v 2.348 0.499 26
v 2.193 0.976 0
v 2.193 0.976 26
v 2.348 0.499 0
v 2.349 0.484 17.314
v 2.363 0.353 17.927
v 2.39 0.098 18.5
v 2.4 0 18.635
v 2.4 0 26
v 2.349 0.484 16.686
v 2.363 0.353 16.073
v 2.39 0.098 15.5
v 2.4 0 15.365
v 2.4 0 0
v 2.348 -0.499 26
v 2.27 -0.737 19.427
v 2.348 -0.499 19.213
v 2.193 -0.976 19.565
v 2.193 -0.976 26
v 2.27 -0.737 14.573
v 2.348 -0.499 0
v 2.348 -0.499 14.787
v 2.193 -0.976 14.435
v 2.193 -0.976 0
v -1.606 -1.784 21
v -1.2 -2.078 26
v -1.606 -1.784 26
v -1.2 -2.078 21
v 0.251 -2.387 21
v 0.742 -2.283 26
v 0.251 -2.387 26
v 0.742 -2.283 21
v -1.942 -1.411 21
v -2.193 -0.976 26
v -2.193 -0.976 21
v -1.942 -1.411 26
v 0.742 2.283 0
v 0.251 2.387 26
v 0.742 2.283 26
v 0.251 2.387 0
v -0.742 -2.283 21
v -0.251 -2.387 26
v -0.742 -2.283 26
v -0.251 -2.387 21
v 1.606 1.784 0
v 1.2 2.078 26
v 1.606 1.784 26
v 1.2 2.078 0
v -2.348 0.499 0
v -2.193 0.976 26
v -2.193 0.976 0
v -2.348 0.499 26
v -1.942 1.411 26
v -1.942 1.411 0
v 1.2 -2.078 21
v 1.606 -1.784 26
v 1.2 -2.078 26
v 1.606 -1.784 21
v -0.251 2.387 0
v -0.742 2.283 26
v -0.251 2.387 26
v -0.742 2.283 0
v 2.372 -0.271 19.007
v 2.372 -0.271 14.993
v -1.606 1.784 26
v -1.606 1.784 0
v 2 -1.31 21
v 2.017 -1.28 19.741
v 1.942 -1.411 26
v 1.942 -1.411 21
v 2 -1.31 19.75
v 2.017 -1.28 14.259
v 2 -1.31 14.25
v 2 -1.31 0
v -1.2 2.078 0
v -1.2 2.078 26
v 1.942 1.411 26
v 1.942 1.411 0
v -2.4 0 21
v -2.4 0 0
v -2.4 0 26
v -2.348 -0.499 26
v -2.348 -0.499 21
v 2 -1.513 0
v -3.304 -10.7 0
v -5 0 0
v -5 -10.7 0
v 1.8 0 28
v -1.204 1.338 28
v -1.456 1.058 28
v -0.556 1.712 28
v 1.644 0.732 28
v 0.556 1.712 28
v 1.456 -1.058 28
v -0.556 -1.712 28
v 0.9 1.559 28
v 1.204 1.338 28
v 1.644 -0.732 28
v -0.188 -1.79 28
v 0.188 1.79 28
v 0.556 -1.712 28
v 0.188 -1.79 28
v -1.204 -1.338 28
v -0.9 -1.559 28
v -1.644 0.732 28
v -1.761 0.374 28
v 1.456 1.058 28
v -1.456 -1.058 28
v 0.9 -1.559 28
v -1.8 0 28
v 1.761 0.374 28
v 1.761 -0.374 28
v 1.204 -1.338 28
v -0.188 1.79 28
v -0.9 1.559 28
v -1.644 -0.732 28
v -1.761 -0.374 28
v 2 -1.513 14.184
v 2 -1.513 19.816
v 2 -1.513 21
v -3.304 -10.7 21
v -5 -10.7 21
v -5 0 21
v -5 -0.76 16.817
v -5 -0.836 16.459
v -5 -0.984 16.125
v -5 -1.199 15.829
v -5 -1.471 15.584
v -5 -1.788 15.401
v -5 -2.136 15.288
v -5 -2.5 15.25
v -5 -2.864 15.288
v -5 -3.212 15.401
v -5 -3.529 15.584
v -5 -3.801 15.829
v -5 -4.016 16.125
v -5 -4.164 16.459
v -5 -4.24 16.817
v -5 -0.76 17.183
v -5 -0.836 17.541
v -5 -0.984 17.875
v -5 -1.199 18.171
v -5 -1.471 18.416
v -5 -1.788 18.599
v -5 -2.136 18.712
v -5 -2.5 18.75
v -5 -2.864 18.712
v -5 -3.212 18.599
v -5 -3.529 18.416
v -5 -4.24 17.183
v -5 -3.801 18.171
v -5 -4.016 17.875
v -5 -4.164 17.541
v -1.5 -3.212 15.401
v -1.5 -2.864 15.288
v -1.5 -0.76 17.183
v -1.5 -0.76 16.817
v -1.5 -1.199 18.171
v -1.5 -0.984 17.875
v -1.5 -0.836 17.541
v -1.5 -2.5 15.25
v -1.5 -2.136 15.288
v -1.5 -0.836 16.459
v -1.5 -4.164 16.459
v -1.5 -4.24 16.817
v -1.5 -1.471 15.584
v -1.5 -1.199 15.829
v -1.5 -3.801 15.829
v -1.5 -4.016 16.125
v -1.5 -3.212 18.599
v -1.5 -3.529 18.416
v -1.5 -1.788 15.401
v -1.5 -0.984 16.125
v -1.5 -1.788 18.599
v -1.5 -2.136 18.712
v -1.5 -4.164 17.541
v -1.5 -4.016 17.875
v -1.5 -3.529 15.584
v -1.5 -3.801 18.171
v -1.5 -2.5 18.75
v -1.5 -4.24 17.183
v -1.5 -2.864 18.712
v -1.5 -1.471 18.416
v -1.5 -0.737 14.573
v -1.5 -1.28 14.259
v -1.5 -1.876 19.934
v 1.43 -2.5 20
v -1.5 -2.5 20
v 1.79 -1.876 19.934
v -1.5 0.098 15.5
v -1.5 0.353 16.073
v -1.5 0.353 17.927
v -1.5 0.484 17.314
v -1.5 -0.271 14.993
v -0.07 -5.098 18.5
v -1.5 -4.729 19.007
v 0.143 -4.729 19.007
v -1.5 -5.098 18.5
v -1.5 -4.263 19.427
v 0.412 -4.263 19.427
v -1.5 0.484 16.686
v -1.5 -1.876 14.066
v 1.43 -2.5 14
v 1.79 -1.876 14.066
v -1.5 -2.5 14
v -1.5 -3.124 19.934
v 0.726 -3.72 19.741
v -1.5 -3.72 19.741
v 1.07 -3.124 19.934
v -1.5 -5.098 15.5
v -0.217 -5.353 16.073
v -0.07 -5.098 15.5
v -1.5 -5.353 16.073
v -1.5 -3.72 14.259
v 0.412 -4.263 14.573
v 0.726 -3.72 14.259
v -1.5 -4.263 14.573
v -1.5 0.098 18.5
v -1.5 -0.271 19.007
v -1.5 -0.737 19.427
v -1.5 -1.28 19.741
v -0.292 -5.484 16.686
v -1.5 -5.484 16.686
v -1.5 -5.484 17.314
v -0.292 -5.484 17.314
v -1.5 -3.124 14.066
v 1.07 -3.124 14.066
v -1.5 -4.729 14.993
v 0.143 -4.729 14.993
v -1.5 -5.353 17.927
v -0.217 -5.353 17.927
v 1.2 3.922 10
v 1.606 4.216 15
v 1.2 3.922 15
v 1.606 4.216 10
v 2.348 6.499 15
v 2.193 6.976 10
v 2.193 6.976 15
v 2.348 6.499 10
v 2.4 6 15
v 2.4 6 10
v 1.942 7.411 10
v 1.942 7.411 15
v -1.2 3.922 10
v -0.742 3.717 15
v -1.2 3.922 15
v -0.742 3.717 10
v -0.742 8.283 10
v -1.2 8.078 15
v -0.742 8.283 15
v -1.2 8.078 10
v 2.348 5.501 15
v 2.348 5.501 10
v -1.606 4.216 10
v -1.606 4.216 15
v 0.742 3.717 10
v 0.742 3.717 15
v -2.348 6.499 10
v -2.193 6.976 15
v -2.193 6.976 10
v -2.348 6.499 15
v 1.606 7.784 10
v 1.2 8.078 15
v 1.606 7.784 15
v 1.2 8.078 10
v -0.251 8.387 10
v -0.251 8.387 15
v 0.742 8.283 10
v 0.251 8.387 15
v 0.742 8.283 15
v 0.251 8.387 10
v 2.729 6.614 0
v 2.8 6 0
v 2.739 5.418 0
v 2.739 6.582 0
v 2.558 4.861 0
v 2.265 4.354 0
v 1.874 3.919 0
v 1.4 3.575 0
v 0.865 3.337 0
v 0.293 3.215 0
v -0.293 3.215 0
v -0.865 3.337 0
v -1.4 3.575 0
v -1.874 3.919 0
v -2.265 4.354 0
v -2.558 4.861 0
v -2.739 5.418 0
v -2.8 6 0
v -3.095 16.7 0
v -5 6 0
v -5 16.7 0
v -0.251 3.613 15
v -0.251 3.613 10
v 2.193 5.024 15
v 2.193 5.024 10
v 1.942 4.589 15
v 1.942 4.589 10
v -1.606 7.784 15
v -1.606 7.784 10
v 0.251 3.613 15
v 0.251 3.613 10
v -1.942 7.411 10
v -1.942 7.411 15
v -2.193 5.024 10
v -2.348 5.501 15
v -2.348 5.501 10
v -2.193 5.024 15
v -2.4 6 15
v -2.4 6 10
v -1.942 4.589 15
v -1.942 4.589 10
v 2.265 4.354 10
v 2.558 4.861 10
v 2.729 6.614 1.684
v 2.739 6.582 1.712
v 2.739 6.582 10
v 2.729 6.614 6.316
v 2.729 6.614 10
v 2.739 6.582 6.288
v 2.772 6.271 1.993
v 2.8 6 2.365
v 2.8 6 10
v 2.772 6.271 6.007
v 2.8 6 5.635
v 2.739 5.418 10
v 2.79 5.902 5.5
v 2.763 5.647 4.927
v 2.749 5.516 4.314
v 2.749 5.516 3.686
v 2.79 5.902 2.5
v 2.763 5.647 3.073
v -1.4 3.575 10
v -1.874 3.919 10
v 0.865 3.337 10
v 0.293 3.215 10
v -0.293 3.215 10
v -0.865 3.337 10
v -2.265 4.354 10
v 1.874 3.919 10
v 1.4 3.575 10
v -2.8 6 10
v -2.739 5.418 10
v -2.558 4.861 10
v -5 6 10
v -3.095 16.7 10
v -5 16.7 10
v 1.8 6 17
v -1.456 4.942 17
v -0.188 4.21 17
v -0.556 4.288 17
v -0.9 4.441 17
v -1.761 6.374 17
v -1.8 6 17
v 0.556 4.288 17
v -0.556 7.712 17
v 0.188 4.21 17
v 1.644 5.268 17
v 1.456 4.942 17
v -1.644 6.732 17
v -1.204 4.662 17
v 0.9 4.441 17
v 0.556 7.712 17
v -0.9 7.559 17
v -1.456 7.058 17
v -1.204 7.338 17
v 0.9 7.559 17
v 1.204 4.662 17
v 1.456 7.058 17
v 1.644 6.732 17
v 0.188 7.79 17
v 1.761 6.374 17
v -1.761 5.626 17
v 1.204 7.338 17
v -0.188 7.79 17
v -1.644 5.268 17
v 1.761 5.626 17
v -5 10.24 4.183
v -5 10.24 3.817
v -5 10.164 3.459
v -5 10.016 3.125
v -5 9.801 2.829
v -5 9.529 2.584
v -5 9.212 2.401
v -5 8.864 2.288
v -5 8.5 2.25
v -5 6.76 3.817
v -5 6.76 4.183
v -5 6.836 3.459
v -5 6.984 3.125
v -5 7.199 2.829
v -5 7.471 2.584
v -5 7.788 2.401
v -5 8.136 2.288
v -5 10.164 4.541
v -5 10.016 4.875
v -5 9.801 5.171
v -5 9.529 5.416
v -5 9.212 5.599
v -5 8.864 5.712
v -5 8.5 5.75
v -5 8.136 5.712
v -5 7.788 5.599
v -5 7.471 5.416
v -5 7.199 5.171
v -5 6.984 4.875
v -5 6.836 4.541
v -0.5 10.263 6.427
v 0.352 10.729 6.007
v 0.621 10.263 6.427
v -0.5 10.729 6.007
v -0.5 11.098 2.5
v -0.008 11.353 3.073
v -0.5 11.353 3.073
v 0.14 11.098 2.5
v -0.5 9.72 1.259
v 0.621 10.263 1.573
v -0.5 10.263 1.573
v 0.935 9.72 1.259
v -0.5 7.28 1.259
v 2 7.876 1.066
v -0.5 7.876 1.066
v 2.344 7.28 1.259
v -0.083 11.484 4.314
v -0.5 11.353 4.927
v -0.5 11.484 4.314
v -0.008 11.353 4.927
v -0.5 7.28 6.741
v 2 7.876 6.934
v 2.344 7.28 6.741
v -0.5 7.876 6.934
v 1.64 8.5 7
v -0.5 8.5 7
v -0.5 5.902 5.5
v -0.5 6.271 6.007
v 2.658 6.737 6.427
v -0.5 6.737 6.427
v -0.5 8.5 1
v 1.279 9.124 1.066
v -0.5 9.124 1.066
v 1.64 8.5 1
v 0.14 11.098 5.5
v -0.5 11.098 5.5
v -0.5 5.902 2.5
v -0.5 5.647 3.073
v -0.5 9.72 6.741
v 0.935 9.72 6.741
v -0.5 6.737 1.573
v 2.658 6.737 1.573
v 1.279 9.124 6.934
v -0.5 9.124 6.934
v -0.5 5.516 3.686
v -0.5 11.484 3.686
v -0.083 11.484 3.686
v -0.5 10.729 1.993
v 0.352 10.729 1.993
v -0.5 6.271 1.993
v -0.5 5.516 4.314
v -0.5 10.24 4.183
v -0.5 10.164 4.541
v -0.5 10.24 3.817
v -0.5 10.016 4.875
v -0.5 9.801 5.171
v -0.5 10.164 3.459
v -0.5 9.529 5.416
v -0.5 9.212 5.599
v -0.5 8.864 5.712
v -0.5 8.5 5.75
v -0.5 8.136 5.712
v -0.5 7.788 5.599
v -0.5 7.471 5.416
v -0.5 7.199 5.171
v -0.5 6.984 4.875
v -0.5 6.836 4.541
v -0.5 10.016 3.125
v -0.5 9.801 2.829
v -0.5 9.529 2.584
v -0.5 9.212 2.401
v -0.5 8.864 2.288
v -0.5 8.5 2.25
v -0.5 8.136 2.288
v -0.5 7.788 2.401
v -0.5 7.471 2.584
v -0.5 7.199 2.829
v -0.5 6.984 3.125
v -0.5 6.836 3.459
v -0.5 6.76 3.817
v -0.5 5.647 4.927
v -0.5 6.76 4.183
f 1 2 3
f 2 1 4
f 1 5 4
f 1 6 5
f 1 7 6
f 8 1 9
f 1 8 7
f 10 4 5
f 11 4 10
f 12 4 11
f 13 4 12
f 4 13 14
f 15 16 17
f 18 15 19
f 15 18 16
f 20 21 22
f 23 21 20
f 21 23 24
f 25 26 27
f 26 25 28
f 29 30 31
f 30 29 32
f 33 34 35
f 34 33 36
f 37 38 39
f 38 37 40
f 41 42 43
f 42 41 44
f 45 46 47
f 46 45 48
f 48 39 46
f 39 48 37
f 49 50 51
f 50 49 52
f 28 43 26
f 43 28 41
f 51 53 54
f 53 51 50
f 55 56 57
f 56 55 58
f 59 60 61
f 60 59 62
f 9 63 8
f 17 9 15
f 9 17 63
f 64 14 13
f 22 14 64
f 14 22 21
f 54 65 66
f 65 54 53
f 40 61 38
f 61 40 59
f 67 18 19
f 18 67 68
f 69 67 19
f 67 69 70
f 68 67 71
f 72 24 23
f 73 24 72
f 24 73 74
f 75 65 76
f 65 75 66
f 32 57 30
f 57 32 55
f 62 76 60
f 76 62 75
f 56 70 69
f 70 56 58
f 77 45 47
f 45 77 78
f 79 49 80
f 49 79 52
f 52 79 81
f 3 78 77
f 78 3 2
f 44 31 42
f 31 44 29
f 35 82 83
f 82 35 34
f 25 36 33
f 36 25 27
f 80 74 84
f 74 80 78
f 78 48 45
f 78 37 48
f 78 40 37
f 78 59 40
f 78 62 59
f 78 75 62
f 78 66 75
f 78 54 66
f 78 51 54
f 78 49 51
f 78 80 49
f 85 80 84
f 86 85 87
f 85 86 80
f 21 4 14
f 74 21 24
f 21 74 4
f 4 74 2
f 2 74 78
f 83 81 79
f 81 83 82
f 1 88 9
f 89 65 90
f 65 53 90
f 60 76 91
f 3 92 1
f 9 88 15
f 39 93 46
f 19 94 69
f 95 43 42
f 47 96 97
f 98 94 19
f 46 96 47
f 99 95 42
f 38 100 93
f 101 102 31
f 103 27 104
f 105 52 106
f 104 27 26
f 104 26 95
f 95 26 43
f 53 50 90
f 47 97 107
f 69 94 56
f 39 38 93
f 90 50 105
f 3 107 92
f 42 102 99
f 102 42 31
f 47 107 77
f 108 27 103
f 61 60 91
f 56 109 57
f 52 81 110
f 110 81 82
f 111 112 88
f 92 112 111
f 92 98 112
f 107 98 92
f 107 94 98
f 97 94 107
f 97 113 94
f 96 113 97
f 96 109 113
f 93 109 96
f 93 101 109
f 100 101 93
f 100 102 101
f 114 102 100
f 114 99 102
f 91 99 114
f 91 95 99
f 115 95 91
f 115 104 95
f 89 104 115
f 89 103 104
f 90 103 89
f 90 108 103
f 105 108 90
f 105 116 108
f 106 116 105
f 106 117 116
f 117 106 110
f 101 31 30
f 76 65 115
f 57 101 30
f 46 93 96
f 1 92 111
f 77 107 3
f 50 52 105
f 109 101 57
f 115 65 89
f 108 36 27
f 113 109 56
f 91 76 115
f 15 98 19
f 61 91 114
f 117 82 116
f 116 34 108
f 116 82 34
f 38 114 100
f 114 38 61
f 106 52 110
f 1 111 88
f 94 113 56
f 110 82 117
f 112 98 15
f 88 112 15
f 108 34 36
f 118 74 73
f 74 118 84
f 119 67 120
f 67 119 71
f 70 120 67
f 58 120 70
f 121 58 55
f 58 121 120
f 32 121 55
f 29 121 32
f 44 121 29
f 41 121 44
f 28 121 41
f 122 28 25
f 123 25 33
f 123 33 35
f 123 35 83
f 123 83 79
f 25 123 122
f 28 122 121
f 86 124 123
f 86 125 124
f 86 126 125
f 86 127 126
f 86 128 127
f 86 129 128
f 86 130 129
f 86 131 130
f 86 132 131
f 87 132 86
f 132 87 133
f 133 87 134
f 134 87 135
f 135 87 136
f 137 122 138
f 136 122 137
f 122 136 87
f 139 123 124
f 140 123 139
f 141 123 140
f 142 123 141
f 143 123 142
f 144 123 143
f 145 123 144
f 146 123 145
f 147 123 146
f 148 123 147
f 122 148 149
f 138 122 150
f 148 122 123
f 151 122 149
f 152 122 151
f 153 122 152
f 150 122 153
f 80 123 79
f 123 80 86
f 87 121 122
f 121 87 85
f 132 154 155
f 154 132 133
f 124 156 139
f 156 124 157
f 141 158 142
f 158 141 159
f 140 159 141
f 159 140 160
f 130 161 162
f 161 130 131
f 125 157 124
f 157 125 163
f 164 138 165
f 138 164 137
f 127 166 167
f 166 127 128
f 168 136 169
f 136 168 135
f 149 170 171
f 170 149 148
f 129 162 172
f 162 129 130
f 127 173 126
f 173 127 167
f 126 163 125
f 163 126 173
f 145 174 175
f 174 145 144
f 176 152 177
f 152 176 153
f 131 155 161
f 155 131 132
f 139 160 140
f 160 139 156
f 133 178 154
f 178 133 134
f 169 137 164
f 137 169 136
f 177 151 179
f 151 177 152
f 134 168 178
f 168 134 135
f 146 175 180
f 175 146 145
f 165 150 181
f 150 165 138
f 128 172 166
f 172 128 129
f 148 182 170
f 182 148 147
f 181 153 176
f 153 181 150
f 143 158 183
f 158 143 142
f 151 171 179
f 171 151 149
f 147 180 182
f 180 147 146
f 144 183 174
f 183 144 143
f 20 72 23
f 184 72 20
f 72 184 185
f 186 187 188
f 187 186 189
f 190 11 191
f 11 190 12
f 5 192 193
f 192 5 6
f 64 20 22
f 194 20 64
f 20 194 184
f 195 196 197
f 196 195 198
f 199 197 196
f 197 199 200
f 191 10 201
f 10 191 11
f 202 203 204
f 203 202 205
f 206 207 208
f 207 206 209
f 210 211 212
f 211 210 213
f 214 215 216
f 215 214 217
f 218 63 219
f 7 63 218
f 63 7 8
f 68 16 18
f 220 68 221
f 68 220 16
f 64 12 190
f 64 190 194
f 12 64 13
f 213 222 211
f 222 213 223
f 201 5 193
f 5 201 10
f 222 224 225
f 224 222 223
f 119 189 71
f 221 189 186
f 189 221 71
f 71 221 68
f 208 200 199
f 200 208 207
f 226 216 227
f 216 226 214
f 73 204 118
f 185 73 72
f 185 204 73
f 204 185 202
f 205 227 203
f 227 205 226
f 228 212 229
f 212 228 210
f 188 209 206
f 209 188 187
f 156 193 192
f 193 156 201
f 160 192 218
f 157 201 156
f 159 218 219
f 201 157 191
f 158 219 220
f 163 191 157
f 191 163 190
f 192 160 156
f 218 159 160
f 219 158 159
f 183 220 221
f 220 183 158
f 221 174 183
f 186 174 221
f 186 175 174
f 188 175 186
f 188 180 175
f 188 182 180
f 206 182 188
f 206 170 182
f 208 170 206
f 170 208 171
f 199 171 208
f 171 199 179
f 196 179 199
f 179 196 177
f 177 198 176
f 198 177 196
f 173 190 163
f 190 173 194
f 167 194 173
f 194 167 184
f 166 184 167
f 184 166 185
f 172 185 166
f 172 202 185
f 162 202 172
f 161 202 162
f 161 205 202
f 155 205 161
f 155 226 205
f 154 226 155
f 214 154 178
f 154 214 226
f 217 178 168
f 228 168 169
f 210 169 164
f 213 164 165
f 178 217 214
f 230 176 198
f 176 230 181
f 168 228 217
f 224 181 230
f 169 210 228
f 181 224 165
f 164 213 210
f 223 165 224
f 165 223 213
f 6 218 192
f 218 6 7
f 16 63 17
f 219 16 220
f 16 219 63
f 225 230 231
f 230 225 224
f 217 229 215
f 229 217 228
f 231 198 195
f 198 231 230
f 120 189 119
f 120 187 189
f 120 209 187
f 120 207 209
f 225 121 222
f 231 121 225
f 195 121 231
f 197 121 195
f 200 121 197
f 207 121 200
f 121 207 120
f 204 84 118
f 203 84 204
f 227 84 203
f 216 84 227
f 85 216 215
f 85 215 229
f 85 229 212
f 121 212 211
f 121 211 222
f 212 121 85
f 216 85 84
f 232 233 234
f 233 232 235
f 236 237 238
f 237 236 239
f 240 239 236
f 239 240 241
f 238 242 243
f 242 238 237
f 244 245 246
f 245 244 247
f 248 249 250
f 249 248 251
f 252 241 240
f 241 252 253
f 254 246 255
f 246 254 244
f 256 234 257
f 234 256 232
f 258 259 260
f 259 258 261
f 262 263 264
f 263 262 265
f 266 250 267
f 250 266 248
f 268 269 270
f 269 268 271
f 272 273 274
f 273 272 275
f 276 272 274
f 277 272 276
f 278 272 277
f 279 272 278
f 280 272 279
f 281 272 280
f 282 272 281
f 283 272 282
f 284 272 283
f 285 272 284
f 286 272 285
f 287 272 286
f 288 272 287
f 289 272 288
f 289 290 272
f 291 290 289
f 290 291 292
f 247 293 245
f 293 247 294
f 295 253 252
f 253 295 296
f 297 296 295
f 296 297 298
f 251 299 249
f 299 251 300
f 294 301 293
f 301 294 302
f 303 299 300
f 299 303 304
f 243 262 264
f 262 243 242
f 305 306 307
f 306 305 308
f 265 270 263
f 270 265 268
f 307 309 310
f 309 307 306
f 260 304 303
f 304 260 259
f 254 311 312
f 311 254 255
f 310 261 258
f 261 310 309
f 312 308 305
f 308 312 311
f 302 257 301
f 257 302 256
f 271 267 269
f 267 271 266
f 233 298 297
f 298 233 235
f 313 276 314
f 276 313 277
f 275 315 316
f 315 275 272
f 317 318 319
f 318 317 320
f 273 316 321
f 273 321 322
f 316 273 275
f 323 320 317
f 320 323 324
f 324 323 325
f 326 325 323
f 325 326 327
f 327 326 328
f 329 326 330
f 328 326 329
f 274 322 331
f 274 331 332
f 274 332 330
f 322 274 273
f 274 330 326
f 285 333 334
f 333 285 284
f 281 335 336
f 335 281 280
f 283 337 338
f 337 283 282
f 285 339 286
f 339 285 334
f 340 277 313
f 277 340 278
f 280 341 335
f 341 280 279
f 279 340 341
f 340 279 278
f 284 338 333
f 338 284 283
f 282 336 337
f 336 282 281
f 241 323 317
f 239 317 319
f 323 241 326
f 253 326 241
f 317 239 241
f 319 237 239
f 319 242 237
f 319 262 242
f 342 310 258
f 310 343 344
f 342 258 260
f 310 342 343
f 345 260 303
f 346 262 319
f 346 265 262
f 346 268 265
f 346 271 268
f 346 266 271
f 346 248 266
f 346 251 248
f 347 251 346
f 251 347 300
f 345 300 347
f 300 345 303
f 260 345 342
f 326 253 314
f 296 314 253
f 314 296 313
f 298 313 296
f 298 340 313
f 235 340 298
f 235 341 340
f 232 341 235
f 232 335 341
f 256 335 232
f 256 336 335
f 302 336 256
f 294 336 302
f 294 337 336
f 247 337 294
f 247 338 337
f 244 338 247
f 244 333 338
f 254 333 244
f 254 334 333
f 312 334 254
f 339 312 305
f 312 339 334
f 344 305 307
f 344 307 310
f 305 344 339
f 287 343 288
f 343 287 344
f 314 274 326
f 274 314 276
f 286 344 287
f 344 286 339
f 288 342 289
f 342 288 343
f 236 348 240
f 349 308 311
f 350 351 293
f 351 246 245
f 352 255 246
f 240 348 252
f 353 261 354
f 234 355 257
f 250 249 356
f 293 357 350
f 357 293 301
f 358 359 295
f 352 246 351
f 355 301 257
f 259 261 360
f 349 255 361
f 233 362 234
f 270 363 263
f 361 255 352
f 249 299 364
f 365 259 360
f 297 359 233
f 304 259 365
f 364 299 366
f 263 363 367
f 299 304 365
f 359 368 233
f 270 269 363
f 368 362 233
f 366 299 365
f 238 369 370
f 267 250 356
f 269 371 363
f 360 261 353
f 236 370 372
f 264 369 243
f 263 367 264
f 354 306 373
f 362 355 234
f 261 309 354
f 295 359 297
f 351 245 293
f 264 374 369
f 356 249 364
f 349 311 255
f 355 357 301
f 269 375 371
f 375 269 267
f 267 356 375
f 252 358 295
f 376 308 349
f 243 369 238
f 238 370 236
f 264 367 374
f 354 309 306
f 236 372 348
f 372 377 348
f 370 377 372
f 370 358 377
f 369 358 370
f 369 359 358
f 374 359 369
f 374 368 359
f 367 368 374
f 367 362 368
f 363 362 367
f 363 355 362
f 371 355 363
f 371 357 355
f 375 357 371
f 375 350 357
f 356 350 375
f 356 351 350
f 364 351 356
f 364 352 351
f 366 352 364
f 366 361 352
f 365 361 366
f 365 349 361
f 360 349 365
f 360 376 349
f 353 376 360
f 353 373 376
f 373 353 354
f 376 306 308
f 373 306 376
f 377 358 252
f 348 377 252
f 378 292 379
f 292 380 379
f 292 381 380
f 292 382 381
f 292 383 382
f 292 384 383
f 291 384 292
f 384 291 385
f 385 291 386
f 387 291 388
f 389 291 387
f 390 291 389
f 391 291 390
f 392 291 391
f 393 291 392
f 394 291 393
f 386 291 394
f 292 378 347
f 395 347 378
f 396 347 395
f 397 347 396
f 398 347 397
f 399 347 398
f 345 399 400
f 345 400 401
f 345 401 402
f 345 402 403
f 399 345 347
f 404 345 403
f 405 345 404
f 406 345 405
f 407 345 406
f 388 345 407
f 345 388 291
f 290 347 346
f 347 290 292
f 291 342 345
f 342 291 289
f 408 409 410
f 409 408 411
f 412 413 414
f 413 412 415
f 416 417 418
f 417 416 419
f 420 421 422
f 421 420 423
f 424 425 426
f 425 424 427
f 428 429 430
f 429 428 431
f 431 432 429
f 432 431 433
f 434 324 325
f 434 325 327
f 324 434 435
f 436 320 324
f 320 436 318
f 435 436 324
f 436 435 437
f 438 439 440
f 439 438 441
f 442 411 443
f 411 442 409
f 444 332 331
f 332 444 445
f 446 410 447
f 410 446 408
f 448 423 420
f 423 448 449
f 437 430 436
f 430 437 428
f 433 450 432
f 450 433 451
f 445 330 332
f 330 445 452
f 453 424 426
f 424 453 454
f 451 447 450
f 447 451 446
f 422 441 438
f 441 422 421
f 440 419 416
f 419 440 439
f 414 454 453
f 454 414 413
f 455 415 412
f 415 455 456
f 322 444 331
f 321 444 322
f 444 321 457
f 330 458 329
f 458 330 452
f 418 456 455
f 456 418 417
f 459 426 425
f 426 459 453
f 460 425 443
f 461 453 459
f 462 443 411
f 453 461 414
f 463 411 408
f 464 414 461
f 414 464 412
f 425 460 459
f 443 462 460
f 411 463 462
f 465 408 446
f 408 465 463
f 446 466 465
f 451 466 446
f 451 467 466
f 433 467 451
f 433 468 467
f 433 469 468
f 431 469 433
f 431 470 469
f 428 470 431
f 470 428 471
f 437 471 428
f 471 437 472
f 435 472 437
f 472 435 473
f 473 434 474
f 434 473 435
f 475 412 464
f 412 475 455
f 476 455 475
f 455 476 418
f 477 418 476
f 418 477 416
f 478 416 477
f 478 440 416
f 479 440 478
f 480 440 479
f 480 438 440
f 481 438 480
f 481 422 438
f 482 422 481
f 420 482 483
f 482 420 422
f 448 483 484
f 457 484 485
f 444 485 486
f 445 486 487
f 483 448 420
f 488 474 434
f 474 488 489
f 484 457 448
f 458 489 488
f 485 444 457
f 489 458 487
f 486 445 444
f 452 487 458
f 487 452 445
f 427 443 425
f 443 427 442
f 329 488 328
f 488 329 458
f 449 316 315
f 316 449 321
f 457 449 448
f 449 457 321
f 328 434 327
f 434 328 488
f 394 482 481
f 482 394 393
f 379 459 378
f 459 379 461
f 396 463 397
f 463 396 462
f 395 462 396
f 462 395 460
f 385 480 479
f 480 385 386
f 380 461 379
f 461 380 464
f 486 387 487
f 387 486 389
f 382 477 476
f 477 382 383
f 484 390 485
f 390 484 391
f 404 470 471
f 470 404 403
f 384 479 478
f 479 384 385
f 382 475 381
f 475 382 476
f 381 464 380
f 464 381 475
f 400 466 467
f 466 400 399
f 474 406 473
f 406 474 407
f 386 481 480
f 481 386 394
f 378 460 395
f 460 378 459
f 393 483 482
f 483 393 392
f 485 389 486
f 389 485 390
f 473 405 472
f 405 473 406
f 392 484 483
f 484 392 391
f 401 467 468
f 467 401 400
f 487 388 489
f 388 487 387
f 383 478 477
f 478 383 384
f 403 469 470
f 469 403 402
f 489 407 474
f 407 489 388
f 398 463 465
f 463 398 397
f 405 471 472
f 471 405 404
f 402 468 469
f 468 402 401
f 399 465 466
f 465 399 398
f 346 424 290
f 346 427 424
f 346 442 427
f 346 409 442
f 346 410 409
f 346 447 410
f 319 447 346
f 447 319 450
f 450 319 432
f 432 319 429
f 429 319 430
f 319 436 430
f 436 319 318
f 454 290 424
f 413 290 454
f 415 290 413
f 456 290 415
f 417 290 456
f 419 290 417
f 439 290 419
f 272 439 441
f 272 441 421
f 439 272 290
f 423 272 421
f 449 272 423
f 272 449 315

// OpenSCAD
// PRUSA iteration4
// Einsy cover hinges
// GNU GPL v3
// Josef Průša <iam@josefprusa.cz> and contributors
// http://www.reprap.org/wiki/Prusa_Mendel
// http://prusamendel.org

module upper_hinge() {
  difference() {
    union() {
      // body
      cylinder(h=26, r=2.4, $fn=30);
      translate([0, 0, 26]) cylinder(h=2, r1=2.4, r2=1.8, $fn=30);
      translate([-5, -10.7, 0]) cube([7, 10.7, 21]);
    }
    // M3 screw hole
    translate([-12.5, -2.5, 17]) rotate([0, 90, 0]) cylinder(h=20, r=1.75, $fn=30);
    translate([-1.5, -2.5, 17]) rotate([0, 90, 0]) cylinder(h=9, r=3, $fn=30);
    // angle cut
    translate([-2.9, -20, -1]) rotate([0, 0, 60]) cube([25, 5, 26]);
  }
}

module lower_hinge() {
  difference() {
    union() {
      // body
      translate([0, 6, 0]) cylinder(h=15, r=2.4, $fn=30);
      translate([0, 6, 0]) cylinder(h=10, r=2.8, $fn=30);
      translate([0, 6, 15]) cylinder(h=2, r1=2.4, r2=1.8, $fn=30);
      translate([-5, 6, 0]) cube([7, 10.7, 10]);
    }
    // M3 screw
    translate([-0.5, 8.5, 4]) rotate([0, 90, 0]) cylinder(h=20, r=3, $fn=30);
    translate([-12, 8.5, 4]) rotate([0, 90, 0]) cylinder(h=20, r=1.75, $fn=30);
    // angle cut
    translate([-5, 20, -1]) rotate([0, 0, -60]) cube([20, 5, 20]);
  }
}

upper_hinge();
lower_hinge();
